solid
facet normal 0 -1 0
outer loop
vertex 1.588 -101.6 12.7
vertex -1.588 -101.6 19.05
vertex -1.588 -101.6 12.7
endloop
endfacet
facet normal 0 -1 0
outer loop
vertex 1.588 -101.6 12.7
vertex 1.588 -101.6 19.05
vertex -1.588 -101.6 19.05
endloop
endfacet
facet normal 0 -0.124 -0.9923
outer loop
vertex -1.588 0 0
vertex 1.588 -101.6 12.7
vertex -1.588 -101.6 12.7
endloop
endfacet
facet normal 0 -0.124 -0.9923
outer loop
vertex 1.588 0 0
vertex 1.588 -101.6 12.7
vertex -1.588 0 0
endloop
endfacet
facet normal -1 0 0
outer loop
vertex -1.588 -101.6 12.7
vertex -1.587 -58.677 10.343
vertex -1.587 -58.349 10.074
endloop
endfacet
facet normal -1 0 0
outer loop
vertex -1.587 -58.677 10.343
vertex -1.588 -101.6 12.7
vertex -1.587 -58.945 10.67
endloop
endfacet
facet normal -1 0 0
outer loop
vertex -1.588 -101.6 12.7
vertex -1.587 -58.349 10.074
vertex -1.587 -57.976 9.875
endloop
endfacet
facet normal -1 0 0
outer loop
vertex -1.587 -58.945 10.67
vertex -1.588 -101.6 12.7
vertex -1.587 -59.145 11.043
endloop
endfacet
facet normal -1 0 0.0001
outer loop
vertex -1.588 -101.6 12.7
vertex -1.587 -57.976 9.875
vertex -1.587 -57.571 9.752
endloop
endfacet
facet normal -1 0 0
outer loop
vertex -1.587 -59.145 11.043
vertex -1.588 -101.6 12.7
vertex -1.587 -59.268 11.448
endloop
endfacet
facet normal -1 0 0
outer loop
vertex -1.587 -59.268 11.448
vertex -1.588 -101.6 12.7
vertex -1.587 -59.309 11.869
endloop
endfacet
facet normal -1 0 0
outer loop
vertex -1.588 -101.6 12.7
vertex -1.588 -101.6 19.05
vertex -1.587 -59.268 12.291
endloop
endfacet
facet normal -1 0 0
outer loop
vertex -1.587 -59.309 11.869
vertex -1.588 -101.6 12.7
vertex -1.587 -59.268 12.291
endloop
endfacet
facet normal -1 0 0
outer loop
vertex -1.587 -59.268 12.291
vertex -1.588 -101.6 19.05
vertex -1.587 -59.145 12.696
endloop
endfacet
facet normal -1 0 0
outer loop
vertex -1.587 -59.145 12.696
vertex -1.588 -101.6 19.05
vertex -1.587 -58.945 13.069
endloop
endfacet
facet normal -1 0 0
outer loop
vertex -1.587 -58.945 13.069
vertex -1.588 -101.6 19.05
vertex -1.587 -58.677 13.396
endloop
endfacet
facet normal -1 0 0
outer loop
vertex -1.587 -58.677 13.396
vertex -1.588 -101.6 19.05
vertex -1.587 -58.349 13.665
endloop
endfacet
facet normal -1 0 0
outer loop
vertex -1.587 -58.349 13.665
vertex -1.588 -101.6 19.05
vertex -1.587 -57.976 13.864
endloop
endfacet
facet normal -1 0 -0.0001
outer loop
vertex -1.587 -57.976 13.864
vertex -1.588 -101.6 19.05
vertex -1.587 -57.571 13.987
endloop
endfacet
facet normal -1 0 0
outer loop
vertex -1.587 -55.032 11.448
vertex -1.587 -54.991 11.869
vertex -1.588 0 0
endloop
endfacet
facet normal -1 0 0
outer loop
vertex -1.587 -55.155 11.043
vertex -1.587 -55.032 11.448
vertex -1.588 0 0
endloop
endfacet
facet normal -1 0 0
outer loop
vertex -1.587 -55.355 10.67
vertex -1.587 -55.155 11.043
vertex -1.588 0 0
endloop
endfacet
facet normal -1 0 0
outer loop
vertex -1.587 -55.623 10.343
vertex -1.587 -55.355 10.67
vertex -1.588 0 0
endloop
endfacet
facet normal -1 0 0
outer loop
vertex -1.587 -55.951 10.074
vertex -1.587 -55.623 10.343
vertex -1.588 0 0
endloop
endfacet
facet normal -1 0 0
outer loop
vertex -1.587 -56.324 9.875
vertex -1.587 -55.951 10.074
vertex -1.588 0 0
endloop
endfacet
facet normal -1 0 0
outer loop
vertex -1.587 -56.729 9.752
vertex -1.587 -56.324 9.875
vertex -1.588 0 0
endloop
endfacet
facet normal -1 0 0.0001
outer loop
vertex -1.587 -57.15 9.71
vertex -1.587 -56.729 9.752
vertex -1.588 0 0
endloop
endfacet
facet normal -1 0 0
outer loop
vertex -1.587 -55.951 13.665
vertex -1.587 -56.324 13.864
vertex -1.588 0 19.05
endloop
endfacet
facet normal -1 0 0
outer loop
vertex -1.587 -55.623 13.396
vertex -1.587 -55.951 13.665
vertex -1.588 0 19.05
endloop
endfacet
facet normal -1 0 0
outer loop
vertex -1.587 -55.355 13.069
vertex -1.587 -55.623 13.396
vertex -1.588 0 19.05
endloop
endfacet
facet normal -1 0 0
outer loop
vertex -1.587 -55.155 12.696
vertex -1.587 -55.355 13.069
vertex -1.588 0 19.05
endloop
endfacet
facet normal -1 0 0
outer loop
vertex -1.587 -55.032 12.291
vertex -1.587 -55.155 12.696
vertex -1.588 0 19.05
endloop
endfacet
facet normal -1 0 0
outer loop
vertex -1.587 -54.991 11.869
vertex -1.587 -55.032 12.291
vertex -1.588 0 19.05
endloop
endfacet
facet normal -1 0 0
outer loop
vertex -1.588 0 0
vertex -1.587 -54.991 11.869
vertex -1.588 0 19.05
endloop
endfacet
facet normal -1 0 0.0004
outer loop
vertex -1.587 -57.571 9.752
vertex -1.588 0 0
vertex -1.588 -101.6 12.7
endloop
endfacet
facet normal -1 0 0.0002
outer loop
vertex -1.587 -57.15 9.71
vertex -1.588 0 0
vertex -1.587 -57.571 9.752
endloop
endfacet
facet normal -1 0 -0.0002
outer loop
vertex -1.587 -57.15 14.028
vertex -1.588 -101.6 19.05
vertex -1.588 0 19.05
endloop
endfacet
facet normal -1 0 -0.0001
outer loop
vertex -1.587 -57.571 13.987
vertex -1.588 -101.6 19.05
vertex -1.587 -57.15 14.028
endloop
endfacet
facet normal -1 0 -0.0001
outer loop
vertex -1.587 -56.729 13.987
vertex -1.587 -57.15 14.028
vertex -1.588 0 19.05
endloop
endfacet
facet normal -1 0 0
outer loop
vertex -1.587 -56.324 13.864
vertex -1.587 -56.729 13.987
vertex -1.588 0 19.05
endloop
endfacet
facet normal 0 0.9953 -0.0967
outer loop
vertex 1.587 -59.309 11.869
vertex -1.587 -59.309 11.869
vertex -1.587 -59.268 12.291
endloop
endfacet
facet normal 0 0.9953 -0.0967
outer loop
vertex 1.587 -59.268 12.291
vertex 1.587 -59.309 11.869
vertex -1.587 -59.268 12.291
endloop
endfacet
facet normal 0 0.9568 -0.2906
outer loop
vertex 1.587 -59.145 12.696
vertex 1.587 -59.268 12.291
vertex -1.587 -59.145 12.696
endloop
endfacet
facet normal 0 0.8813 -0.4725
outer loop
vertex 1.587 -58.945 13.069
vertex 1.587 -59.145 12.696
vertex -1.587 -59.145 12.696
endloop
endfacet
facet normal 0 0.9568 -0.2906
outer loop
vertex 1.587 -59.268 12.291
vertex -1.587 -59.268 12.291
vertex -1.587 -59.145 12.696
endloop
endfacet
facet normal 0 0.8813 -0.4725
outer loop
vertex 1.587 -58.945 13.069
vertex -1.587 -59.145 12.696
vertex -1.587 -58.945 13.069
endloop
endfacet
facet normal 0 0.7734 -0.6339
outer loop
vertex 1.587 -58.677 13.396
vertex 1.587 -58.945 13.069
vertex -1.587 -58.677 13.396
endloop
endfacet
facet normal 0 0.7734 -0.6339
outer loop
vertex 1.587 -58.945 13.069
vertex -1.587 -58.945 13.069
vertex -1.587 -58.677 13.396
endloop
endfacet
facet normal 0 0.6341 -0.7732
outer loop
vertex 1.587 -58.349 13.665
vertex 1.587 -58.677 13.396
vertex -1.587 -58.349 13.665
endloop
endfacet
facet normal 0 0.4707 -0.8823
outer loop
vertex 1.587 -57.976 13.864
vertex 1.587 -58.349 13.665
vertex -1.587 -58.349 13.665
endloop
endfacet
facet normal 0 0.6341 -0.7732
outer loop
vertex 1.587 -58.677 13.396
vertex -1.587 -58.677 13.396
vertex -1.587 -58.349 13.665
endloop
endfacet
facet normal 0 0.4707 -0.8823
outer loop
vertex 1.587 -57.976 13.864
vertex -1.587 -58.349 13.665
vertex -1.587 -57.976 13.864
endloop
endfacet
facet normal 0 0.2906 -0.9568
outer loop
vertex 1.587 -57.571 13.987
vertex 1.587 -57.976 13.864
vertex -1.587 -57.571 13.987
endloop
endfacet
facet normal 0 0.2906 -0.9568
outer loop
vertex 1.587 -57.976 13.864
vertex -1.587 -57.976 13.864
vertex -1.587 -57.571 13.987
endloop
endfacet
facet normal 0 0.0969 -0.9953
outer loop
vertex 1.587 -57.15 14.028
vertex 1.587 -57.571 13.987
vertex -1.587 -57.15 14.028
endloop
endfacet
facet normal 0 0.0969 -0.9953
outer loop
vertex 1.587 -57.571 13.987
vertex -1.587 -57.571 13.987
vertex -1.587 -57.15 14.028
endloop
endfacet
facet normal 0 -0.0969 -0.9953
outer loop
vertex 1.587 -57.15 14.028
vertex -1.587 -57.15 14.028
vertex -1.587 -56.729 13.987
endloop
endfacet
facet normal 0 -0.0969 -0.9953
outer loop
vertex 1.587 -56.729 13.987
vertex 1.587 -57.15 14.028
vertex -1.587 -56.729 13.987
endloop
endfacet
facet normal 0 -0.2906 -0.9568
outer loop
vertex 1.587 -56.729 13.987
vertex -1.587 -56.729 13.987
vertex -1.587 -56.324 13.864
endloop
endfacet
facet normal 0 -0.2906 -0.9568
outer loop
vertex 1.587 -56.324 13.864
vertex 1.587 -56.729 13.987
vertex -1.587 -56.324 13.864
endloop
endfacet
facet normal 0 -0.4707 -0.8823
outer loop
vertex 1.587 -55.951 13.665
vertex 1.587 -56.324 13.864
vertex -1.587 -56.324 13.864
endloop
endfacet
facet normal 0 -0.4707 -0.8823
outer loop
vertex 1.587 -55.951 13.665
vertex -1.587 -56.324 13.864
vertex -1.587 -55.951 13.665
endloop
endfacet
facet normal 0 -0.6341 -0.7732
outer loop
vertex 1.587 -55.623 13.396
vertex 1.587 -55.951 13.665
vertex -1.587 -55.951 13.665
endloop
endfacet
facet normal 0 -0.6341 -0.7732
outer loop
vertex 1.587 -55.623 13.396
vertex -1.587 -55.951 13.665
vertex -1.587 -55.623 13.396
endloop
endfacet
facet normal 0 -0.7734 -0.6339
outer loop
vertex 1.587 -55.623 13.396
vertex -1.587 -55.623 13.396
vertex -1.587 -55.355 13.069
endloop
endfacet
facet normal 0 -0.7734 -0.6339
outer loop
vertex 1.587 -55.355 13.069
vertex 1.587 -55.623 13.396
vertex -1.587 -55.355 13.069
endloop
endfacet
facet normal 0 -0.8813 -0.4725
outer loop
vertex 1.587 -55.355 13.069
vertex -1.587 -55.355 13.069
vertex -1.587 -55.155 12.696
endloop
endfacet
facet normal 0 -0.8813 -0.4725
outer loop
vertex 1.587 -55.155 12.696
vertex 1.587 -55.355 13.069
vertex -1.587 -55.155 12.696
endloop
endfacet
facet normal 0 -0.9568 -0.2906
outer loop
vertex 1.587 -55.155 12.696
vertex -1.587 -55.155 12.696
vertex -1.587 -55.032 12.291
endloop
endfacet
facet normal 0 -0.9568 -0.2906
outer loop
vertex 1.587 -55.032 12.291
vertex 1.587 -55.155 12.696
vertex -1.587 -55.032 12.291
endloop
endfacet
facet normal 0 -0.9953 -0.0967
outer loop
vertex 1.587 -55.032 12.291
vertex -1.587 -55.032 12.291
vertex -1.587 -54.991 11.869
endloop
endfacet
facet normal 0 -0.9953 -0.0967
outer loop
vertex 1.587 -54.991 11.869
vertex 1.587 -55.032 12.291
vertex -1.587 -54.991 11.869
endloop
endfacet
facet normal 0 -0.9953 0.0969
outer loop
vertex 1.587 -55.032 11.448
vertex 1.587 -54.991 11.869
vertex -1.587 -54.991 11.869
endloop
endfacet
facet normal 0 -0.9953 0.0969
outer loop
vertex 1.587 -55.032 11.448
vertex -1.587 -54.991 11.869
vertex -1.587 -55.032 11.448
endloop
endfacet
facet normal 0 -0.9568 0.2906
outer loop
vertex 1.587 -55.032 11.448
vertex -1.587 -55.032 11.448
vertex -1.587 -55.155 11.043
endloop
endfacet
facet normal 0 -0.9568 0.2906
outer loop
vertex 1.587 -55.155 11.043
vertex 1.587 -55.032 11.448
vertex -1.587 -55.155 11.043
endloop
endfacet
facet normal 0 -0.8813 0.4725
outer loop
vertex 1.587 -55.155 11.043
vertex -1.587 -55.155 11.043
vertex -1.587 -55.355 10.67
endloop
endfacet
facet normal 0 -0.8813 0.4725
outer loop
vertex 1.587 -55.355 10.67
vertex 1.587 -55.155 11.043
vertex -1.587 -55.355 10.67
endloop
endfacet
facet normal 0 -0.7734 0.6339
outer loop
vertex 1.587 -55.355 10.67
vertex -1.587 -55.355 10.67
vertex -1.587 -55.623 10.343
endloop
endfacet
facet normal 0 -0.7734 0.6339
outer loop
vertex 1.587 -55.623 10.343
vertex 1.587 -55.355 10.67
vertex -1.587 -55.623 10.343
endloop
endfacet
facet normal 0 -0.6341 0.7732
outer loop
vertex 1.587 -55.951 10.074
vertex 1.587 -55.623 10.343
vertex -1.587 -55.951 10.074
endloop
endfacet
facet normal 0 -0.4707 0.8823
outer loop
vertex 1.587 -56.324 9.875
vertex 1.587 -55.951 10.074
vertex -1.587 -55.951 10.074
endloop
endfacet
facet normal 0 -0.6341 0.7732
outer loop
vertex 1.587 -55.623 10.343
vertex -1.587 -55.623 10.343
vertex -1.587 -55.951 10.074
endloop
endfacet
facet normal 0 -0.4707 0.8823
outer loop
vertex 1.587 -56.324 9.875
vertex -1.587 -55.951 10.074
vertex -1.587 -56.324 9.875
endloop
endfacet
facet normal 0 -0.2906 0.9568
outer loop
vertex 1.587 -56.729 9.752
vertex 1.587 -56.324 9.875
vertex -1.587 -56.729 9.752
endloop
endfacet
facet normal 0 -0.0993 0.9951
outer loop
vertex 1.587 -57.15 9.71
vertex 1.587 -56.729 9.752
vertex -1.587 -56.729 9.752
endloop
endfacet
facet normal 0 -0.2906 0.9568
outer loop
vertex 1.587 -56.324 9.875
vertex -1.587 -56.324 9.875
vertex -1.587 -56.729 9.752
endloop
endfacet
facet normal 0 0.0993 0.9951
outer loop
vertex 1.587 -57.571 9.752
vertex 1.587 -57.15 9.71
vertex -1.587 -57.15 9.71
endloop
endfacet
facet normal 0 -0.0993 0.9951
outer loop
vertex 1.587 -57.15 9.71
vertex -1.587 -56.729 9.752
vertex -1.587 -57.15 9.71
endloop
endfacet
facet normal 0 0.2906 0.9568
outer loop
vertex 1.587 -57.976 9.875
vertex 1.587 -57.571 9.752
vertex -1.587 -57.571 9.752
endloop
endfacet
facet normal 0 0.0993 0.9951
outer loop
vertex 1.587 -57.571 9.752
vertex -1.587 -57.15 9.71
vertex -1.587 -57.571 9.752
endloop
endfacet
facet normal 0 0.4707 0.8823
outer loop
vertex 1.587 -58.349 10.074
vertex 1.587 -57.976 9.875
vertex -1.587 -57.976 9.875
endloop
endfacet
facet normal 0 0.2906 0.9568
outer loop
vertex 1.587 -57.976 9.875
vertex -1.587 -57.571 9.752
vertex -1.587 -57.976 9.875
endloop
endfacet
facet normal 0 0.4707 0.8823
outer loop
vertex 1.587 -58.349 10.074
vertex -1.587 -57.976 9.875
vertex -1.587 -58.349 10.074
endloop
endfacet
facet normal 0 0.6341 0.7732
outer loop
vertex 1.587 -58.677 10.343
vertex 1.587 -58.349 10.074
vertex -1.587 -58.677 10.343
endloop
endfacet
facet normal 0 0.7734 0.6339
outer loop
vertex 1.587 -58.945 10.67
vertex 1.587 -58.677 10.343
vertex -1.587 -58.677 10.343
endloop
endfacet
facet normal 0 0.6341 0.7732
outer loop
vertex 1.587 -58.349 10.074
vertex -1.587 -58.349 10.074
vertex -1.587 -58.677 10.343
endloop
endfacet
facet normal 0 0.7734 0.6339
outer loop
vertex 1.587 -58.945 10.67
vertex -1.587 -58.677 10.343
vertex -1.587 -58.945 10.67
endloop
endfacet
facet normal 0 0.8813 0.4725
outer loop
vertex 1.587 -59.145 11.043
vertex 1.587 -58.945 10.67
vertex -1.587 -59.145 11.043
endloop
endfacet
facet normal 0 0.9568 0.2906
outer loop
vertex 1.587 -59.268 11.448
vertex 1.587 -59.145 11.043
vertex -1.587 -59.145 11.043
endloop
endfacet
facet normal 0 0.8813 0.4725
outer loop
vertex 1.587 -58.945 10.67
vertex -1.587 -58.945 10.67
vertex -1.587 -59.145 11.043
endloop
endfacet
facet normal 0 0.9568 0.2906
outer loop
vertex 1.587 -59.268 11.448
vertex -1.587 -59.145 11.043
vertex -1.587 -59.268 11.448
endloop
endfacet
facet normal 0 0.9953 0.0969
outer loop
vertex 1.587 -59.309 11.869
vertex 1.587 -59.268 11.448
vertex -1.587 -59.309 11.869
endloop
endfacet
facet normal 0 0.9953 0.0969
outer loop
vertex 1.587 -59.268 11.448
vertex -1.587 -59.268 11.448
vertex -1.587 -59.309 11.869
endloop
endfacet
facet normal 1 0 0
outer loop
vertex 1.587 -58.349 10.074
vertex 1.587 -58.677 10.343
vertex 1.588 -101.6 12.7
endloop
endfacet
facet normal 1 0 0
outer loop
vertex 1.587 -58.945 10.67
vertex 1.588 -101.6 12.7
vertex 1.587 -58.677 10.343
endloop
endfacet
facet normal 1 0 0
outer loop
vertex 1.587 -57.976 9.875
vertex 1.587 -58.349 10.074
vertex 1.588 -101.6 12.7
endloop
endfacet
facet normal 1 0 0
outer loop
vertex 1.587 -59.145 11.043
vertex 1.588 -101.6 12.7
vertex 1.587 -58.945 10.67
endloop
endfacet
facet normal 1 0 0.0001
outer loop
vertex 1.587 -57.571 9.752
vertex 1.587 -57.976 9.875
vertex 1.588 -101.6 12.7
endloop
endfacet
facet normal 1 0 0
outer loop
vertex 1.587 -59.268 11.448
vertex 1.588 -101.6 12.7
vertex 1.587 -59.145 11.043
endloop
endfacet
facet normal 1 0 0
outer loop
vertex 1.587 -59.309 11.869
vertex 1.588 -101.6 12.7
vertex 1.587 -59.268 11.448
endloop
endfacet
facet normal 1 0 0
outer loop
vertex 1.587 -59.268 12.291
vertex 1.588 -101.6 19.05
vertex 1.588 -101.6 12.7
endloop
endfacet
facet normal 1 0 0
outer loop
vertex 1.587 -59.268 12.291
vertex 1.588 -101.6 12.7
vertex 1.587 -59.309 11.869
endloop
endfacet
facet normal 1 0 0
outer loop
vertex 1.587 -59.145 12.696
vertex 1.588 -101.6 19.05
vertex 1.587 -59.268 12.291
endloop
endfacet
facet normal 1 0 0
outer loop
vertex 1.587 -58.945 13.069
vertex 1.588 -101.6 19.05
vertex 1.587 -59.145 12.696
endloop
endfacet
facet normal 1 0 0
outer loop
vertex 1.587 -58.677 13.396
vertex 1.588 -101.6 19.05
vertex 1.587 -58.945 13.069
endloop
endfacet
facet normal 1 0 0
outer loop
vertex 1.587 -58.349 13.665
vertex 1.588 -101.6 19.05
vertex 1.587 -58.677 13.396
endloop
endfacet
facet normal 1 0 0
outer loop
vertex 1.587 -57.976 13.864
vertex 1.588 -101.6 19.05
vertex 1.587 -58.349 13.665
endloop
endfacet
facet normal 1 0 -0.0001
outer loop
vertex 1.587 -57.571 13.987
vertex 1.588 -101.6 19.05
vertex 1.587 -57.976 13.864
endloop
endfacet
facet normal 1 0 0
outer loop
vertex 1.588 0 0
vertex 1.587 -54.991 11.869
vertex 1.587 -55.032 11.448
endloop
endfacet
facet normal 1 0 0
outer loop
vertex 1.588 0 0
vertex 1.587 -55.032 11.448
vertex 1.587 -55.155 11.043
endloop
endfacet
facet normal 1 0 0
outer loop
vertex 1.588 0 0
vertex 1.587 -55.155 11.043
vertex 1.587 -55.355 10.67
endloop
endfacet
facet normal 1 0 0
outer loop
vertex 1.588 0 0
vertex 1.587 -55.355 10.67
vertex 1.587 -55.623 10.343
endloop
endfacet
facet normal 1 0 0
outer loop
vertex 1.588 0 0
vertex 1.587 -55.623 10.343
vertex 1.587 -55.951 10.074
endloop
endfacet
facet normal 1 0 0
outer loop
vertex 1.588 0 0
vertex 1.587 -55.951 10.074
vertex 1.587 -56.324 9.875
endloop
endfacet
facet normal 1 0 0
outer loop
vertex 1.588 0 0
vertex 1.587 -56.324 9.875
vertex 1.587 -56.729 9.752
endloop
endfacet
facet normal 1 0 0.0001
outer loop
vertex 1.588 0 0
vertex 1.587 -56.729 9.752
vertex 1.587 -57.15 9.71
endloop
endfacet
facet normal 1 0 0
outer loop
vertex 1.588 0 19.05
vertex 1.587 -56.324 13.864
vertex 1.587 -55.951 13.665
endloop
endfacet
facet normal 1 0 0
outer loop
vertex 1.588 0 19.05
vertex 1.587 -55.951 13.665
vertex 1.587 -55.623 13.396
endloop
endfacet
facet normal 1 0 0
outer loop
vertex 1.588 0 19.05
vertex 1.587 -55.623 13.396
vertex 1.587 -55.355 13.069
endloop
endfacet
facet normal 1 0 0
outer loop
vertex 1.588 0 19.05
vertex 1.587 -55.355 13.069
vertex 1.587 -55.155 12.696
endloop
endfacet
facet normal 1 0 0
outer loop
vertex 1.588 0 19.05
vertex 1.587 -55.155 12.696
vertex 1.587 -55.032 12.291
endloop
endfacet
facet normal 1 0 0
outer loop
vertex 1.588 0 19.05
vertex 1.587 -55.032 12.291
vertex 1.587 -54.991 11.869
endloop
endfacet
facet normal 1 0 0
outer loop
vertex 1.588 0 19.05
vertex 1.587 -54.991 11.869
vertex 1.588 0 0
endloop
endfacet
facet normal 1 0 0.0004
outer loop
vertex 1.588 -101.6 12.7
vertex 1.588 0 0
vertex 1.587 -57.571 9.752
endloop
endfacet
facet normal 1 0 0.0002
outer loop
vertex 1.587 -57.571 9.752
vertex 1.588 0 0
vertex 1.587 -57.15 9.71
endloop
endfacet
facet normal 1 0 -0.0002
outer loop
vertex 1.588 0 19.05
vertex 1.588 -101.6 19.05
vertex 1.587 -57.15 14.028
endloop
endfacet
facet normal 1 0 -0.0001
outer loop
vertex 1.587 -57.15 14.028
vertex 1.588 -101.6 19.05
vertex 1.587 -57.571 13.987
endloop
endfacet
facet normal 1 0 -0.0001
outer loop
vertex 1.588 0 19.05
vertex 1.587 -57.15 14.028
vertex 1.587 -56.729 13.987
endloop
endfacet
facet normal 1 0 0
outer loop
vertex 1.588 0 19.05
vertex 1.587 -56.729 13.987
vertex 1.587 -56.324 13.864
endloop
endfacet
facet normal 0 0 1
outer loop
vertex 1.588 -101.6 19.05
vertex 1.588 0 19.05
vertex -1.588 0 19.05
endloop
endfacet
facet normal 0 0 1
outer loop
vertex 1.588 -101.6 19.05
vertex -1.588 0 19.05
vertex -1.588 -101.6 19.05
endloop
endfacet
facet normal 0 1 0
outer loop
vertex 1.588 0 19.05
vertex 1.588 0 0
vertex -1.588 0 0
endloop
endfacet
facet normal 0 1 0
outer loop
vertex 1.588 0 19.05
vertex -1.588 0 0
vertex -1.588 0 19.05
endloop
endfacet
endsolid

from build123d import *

# Parameters (mm, degrees)
F1_DEPTH = 1.5875
F3_D     = 4.318
F3_DEPTH = 762
F3_TIP   = 1.2972580765


with BuildPart() as f1:
    # F0 (on Right) → F1 (new body, symmetric)
    with BuildSketch(Plane.YZ):
        Polygon((-101.6, 12.7), (0, 0), (0, 19.05), (-101.6, 19.05), align=None)
    extrude(amount=F1_DEPTH, both=True)

    # F3
    with Locations(Plane.YZ.offset(1.5875)):
        with Locations((-57.15, 11.86942)):
            Hole(F3_D / 2, depth=F3_DEPTH)
            with Locations((0, 0, -(F3_DEPTH + F3_TIP / 2))):  # 118° drill point
                Cone(0, F3_D / 2, F3_TIP, mode=Mode.SUBTRACT)


solid = f1.part
